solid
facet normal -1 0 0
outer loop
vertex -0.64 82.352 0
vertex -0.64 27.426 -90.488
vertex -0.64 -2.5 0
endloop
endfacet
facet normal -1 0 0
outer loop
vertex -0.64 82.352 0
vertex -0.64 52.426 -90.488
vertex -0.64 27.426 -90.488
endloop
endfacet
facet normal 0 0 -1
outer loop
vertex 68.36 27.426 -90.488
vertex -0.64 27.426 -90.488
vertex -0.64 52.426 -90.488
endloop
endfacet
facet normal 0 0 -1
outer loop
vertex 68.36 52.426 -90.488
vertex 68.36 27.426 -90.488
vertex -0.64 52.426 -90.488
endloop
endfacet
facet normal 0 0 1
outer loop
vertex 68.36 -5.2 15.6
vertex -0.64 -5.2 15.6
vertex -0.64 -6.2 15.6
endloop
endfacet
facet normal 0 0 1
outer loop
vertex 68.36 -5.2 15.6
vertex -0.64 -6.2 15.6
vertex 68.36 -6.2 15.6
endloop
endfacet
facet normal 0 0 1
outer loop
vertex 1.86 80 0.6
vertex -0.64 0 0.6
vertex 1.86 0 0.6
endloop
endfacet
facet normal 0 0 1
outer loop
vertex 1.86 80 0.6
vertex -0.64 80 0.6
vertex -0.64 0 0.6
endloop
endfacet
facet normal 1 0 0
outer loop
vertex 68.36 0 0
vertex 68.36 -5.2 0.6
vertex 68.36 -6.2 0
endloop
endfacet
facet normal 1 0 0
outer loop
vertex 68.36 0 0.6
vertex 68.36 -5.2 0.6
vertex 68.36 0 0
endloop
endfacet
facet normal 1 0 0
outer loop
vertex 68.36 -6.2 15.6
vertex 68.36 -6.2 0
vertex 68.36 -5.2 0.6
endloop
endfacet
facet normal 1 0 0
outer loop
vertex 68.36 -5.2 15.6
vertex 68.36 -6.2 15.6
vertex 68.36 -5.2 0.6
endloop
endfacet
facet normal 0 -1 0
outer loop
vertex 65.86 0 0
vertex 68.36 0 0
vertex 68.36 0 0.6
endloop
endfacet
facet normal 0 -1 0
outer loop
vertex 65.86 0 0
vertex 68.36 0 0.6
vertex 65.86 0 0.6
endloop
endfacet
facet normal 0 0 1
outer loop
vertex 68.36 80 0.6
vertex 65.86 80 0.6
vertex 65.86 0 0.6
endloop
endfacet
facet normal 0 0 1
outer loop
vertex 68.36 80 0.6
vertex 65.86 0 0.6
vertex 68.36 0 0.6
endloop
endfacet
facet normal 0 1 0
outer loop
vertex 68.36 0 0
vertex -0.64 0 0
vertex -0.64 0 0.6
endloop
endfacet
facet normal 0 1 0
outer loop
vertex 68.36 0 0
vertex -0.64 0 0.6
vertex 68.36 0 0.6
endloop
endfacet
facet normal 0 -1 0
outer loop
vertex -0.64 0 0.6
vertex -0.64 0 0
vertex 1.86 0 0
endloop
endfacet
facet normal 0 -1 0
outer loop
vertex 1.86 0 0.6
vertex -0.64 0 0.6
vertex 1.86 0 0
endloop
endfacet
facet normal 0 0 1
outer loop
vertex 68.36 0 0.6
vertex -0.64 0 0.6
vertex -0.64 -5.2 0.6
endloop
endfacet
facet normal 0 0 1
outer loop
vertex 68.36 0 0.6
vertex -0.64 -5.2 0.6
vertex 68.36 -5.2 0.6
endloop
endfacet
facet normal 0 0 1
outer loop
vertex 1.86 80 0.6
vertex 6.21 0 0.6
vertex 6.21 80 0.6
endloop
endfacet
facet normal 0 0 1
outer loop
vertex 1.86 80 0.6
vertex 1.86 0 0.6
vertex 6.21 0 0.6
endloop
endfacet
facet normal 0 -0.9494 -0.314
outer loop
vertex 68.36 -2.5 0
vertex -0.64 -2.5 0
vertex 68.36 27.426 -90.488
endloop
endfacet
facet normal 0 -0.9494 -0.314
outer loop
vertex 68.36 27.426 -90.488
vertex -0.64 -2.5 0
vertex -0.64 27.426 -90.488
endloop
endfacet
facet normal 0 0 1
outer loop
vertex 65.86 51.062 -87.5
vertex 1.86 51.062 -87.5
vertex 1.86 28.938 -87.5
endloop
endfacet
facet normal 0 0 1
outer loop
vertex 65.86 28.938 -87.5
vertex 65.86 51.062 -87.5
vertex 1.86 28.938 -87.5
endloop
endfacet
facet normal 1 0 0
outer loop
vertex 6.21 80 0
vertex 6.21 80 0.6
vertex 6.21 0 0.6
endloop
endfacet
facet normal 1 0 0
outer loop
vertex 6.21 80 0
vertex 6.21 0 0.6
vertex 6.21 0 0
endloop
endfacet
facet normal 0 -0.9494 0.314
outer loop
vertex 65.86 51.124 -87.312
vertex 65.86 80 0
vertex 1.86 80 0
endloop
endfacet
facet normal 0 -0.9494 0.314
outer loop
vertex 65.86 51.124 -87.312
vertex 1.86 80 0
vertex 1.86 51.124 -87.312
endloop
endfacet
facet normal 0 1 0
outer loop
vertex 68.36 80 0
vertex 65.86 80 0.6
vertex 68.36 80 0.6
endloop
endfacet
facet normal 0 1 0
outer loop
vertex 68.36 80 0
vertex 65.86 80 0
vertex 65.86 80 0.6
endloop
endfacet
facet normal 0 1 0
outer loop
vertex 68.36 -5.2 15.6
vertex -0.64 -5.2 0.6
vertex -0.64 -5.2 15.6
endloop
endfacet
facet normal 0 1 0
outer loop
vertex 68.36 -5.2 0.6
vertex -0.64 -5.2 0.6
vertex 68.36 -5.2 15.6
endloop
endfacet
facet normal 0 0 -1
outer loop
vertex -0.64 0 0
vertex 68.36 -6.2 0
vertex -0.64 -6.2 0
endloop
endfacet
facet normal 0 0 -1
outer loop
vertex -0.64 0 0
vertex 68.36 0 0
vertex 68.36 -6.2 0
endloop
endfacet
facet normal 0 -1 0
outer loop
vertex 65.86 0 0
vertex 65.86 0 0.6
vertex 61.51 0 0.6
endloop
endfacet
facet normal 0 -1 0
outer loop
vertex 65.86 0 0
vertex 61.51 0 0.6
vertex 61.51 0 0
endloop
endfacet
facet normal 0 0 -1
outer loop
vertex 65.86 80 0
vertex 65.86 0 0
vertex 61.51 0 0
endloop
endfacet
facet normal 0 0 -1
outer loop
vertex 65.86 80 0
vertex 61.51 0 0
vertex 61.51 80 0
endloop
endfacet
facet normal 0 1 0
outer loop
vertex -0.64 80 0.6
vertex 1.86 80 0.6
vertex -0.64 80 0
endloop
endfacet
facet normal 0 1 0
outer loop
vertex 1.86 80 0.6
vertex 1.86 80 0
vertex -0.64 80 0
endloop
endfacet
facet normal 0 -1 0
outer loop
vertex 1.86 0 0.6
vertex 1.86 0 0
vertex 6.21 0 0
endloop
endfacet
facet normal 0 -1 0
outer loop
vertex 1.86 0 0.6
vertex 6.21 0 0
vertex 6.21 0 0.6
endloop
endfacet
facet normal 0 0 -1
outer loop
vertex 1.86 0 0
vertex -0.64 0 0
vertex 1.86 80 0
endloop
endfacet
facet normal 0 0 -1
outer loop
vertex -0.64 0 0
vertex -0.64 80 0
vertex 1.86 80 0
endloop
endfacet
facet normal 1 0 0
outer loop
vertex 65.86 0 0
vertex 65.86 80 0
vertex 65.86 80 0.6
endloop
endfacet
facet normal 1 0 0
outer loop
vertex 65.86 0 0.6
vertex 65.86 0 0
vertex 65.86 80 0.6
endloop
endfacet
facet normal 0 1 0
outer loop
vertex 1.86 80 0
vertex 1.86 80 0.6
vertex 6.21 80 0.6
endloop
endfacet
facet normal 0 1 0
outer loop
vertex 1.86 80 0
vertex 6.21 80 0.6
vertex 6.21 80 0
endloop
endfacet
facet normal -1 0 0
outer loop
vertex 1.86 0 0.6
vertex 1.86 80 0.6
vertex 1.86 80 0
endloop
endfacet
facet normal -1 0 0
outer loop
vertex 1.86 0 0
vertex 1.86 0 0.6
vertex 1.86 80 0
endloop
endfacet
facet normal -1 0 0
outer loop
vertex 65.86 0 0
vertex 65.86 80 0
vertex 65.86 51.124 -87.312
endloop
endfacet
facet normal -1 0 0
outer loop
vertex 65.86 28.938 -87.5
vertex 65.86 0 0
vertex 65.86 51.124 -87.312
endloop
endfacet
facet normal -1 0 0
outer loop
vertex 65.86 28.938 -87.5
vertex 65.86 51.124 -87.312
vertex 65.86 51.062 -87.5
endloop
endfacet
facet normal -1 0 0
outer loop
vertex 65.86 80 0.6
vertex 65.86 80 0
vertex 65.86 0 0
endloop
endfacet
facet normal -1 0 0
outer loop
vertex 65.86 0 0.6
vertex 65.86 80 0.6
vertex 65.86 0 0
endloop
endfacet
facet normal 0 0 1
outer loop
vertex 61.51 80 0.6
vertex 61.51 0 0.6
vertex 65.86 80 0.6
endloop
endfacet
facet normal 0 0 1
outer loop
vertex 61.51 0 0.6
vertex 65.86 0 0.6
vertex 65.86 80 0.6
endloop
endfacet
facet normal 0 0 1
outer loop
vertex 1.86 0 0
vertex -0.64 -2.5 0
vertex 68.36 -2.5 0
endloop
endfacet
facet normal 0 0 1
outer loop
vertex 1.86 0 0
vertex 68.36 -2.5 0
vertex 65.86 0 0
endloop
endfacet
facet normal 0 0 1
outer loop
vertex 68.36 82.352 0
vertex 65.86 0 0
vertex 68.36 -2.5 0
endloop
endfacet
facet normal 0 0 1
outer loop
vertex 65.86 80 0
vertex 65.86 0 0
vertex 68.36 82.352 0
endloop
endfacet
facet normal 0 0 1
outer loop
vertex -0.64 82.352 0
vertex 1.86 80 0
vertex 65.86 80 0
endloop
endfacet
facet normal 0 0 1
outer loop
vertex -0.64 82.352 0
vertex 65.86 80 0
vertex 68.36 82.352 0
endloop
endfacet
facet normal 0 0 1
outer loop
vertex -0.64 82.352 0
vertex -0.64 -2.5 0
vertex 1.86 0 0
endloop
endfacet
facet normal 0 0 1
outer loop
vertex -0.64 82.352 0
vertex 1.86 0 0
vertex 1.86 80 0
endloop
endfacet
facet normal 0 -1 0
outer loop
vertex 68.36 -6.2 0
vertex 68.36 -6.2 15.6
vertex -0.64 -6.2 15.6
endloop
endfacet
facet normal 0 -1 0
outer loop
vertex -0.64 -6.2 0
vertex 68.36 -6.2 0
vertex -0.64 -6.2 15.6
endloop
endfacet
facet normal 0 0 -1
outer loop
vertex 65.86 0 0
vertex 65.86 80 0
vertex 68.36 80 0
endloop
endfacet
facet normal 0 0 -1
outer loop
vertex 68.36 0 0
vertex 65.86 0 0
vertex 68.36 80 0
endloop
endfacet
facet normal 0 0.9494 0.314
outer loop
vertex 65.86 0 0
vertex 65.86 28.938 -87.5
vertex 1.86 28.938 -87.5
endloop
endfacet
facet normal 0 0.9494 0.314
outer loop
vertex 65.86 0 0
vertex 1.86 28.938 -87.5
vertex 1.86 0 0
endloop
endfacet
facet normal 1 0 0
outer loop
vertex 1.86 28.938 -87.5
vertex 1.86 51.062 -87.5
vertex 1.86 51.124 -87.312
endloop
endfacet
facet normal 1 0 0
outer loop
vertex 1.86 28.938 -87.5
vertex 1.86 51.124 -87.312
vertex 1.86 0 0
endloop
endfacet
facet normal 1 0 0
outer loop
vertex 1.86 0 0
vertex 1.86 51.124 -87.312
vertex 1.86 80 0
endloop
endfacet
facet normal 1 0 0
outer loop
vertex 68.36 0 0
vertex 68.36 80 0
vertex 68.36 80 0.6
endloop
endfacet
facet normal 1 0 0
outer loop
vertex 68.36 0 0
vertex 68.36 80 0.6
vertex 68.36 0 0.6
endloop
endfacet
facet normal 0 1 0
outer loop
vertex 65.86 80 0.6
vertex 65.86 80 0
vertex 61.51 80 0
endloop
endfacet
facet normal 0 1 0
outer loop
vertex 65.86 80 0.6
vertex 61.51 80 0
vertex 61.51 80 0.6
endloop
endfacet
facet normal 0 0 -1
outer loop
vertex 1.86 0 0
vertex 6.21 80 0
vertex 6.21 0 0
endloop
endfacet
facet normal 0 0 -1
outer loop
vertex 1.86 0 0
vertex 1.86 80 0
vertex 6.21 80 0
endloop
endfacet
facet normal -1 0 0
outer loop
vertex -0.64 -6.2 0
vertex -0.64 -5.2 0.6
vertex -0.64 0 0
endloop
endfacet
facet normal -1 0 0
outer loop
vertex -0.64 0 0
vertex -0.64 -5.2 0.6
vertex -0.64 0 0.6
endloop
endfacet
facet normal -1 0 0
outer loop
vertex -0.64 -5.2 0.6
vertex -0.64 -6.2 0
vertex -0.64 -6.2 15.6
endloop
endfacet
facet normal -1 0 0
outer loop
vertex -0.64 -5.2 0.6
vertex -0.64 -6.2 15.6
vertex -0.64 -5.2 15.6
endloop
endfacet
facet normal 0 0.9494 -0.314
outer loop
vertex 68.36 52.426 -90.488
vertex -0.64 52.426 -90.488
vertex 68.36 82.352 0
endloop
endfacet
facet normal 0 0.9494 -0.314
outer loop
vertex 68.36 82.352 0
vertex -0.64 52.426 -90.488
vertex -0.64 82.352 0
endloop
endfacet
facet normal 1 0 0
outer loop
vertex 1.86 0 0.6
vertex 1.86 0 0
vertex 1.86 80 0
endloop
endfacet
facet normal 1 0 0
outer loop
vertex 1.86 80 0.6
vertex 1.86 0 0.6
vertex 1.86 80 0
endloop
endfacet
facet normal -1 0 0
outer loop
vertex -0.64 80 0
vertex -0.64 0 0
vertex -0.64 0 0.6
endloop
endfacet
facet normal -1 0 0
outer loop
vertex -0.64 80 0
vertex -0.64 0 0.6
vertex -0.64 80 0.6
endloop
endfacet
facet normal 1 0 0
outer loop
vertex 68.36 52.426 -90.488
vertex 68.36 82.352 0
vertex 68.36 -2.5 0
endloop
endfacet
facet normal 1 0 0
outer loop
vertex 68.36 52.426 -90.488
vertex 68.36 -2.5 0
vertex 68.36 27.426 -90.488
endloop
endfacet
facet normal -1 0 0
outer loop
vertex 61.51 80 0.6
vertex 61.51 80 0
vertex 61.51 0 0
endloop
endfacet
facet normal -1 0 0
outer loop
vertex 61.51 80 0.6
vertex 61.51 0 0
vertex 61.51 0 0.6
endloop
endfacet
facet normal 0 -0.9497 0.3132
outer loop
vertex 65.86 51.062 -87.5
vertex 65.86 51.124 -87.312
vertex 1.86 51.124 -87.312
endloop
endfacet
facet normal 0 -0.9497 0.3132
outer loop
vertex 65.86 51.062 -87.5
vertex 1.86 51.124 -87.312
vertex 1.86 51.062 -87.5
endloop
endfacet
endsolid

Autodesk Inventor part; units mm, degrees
ref_plane "Work Plane1" through (0, 32.027, -88.9) normal (0, 0, -1) x (-1, 0, 0)
ref_plane "Work Plane2" through (62.86, 0, 0) normal (1, 0, 0) x (0, 0, -1)
ref_plane "Work Plane4" through (65.86, 0, 0) normal (1, 0, 0) x (0, 0, -1)
sketch "Sketch14" plane through (65.86, 0, 0) normal (1, 0, 0) x (0, 0, -1)
  line L0 (0, 0) -> (0, 80) projected
  line L1 (0, 0) -> (0, -2.5)
  line L2 (0, -2.5) -> (90.4875, 27.4259)
  line L3 (90.4875, 27.4259) -> (90.4875, 52.4259)
  line L4 (90.4875, 52.4259) -> (0, 82.3518)
  line L5 (0, 82.3518) -> (0, 80)
  line L6 (0, 80) -> (87.3125, 51.1242)
  line L7 (87.5, 51.0621) -> (87.5, 28.9379) projected
  line L8 (87.3125, 51.1242) -> (87.5, 51.0621)
  line L9 (87.5, 51.0621) -> (87.5, 28.9379)
  line L10 (87.5, 28.9379) -> (0, 0)
  dimension "d60" = 2.5
  dimension "d61" = 71.7
  dimension "d62" = 25
  dimension "d63" = 108.3
extrude "Extrusion10" add sketch "Sketch14" against normal blind 64 contours L10 L7 L8 L6 L5 L4 L3 L2 L1
ref_plane "Work Plane5" through (1.86, 0, 0) normal (-1, 0, 0) x (0, 0, 1)
sketch "Sketch15" plane through (1.86, 0, 0) normal (-1, 0, 0) x (0, 0, 1)
  line L0 (0, 82.3518) -> (-90.4875, 52.4259) projected
  line L1 (0, 82.3518) -> (-90.4875, 52.4259)
  line L2 (-90.4875, 52.4259) -> (-90.4875, 27.4259) projected
  line L3 (-90.4875, 52.4259) -> (-90.4875, 27.4259)
  line L4 (0, -2.5) -> (-90.4875, 27.4259) projected
  line L5 (-90.4875, 27.4259) -> (0, -2.5)
  line L6 (0, -2.5) -> (0, 82.3518)
  point P0 (0, 0)
extrude "Extrusion11" add sketch "Sketch15" along normal blind 2.5
sketch "Sketch16" plane through (65.86, 0, 0) normal (1, 0, 0) x (0, 0, -1)
  line L0 (90.4875, 52.4259) -> (0, 82.3518) projected
  line L1 (90.4875, 27.4259) -> (90.4875, 52.4259) projected
  line L2 (0, 82.3518) -> (90.4875, 52.4259)
  line L3 (90.4875, 52.4259) -> (90.4875, 27.4259)
  line L4 (0, -2.5) -> (90.4875, 27.4259) projected
  line L5 (90.4875, 27.4259) -> (0, -2.5)
  line L6 (0, 82.3518) -> (0, 80) projected
  line L7 (0, -2.5) -> (0, 82.3518)
  point P0 (0, 0)
extrude "Extrusion12" add sketch "Sketch16" along normal blind 2.5
sketch "Sketch17" plane through (-0.64, -2.5, 0) normal (0, 0, 1) x (1, 0, 0)
  line L0 (2.5, 2.5) -> (2.5, 82.5) projected
  line L1 (0, 0) -> (0, 84.8518) projected
  line L2 (2.5, 82.5) -> (0, 82.5)
  line L3 (0, 82.5) -> (0, 2.5)
  line L4 (0, 2.5) -> (2.5, 2.5)
  line L5 (2.5, 2.5) -> (2.5, 82.5)
  line L6 (66.5, 82.5) -> (66.5, 2.5) projected
  line L7 (69, 84.8518) -> (69, 0) projected
  line L8 (66.5, 82.5) -> (69, 82.5)
  line L9 (69, 82.5) -> (69, 2.5)
  line L10 (69, 2.5) -> (66.5, 2.5)
  line L11 (66.5, 2.5) -> (66.5, 82.5)
  point P0 (0.64, 2.5)
extrude "Extrusion13" add sketch "Sketch17" along normal blind 0.6 separate body
sketch "Sketch18" plane through (65.86, 0, 0) normal (-1, 0, 0) x (0, 0, 1)
  line L0 (0.6, 0) -> (0.6, 80) projected
  line L1 (0, 80) -> (0.6, 80)
  line L2 (0.6, 80) -> (0.6, 0)
  line L3 (0.6, 0) -> (0, 0)
  line L4 (0, 0) -> (0, 80)
extrude "Extrusion14" add sketch "Sketch18" along normal blind 4.35 separate body
sketch "Sketch19" plane through (1.86, 0, 0) normal (1, 0, 0) x (0, 0, -1)
  line L0 (-0.6, 80) -> (0, 80)
  line L1 (0, 80) -> (0, 0)
  line L2 (0, 0) -> (-0.6, 0)
  line L3 (-0.6, 0) -> (-0.6, 80)
extrude "Extrusion15" add sketch "Sketch19" along normal blind 4.35 separate body
sketch "Sketch25" plane through (-0.64, -2.5, 0) normal (0, 0, 1) x (1, 0, 0)
  line L0 (66.5, 2.5) -> (69, 2.5) projected
  line L1 (69, 2.5) -> (0, 2.5)
  line L2 (0, 2.5) -> (0, -2.7)
  line L3 (0, -2.7) -> (69, -2.7)
  line L4 (69, -2.7) -> (69, 2.5)
  point P0 (0.64, 2.5)
  dimension "d106" = 5.2
extrude "Extrusion17" add sketch "Sketch25" along normal blind 0.6 separate body
sketch "Sketch26" plane through (-0.64, -2.5, 0.6) normal (0, 0, 1) x (1, 0, 0)
  line L0 (0, 2.5) -> (0, -2.7) projected
  line L1 (0, -2.7) -> (69, -2.7)
  line L2 (69, -2.7) -> (69, -3.7)
  line L3 (69, -3.7) -> (0, -3.7)
  line L4 (0, -3.7) -> (0, -2.7)
  point P0 (0.64, 2.5)
  dimension "d109" = 1
extrude "Extrusion18" add sketch "Sketch26" along normal blind 15 bodies 5
sketch "Sketch27" plane through (-0.64, -2.5, 0.6) normal (0, 0, -1) x (-1, 0, 0)
  line L0 (-69, -3.7) -> (-69, -2.7) projected
  line L1 (0, -2.7) -> (-69, -2.7) projected
  line L2 (-69, -3.7) -> (0, -3.7)
  line L3 (0, -3.7) -> (0, -2.7)
  line L4 (0, -2.7) -> (-69, -2.7)
  line L5 (-69, -2.7) -> (-69, -3.7)
  point P0 (-0.64, 2.5)
extrude "Extrusion19" add sketch "Sketch27" along normal blind 0.6 bodies 5
sketch "Sketch28" plane through (-0.64, 27.4259, -90.4875) normal (0, 0, -1) x (-1, 0, 0)
  circle A0 centre (-34.474, 12.5607) radius 10.5
  point P0 (-0.64, -27.4259)
  dimension "d114" = 21
properties part number "CamBody"
